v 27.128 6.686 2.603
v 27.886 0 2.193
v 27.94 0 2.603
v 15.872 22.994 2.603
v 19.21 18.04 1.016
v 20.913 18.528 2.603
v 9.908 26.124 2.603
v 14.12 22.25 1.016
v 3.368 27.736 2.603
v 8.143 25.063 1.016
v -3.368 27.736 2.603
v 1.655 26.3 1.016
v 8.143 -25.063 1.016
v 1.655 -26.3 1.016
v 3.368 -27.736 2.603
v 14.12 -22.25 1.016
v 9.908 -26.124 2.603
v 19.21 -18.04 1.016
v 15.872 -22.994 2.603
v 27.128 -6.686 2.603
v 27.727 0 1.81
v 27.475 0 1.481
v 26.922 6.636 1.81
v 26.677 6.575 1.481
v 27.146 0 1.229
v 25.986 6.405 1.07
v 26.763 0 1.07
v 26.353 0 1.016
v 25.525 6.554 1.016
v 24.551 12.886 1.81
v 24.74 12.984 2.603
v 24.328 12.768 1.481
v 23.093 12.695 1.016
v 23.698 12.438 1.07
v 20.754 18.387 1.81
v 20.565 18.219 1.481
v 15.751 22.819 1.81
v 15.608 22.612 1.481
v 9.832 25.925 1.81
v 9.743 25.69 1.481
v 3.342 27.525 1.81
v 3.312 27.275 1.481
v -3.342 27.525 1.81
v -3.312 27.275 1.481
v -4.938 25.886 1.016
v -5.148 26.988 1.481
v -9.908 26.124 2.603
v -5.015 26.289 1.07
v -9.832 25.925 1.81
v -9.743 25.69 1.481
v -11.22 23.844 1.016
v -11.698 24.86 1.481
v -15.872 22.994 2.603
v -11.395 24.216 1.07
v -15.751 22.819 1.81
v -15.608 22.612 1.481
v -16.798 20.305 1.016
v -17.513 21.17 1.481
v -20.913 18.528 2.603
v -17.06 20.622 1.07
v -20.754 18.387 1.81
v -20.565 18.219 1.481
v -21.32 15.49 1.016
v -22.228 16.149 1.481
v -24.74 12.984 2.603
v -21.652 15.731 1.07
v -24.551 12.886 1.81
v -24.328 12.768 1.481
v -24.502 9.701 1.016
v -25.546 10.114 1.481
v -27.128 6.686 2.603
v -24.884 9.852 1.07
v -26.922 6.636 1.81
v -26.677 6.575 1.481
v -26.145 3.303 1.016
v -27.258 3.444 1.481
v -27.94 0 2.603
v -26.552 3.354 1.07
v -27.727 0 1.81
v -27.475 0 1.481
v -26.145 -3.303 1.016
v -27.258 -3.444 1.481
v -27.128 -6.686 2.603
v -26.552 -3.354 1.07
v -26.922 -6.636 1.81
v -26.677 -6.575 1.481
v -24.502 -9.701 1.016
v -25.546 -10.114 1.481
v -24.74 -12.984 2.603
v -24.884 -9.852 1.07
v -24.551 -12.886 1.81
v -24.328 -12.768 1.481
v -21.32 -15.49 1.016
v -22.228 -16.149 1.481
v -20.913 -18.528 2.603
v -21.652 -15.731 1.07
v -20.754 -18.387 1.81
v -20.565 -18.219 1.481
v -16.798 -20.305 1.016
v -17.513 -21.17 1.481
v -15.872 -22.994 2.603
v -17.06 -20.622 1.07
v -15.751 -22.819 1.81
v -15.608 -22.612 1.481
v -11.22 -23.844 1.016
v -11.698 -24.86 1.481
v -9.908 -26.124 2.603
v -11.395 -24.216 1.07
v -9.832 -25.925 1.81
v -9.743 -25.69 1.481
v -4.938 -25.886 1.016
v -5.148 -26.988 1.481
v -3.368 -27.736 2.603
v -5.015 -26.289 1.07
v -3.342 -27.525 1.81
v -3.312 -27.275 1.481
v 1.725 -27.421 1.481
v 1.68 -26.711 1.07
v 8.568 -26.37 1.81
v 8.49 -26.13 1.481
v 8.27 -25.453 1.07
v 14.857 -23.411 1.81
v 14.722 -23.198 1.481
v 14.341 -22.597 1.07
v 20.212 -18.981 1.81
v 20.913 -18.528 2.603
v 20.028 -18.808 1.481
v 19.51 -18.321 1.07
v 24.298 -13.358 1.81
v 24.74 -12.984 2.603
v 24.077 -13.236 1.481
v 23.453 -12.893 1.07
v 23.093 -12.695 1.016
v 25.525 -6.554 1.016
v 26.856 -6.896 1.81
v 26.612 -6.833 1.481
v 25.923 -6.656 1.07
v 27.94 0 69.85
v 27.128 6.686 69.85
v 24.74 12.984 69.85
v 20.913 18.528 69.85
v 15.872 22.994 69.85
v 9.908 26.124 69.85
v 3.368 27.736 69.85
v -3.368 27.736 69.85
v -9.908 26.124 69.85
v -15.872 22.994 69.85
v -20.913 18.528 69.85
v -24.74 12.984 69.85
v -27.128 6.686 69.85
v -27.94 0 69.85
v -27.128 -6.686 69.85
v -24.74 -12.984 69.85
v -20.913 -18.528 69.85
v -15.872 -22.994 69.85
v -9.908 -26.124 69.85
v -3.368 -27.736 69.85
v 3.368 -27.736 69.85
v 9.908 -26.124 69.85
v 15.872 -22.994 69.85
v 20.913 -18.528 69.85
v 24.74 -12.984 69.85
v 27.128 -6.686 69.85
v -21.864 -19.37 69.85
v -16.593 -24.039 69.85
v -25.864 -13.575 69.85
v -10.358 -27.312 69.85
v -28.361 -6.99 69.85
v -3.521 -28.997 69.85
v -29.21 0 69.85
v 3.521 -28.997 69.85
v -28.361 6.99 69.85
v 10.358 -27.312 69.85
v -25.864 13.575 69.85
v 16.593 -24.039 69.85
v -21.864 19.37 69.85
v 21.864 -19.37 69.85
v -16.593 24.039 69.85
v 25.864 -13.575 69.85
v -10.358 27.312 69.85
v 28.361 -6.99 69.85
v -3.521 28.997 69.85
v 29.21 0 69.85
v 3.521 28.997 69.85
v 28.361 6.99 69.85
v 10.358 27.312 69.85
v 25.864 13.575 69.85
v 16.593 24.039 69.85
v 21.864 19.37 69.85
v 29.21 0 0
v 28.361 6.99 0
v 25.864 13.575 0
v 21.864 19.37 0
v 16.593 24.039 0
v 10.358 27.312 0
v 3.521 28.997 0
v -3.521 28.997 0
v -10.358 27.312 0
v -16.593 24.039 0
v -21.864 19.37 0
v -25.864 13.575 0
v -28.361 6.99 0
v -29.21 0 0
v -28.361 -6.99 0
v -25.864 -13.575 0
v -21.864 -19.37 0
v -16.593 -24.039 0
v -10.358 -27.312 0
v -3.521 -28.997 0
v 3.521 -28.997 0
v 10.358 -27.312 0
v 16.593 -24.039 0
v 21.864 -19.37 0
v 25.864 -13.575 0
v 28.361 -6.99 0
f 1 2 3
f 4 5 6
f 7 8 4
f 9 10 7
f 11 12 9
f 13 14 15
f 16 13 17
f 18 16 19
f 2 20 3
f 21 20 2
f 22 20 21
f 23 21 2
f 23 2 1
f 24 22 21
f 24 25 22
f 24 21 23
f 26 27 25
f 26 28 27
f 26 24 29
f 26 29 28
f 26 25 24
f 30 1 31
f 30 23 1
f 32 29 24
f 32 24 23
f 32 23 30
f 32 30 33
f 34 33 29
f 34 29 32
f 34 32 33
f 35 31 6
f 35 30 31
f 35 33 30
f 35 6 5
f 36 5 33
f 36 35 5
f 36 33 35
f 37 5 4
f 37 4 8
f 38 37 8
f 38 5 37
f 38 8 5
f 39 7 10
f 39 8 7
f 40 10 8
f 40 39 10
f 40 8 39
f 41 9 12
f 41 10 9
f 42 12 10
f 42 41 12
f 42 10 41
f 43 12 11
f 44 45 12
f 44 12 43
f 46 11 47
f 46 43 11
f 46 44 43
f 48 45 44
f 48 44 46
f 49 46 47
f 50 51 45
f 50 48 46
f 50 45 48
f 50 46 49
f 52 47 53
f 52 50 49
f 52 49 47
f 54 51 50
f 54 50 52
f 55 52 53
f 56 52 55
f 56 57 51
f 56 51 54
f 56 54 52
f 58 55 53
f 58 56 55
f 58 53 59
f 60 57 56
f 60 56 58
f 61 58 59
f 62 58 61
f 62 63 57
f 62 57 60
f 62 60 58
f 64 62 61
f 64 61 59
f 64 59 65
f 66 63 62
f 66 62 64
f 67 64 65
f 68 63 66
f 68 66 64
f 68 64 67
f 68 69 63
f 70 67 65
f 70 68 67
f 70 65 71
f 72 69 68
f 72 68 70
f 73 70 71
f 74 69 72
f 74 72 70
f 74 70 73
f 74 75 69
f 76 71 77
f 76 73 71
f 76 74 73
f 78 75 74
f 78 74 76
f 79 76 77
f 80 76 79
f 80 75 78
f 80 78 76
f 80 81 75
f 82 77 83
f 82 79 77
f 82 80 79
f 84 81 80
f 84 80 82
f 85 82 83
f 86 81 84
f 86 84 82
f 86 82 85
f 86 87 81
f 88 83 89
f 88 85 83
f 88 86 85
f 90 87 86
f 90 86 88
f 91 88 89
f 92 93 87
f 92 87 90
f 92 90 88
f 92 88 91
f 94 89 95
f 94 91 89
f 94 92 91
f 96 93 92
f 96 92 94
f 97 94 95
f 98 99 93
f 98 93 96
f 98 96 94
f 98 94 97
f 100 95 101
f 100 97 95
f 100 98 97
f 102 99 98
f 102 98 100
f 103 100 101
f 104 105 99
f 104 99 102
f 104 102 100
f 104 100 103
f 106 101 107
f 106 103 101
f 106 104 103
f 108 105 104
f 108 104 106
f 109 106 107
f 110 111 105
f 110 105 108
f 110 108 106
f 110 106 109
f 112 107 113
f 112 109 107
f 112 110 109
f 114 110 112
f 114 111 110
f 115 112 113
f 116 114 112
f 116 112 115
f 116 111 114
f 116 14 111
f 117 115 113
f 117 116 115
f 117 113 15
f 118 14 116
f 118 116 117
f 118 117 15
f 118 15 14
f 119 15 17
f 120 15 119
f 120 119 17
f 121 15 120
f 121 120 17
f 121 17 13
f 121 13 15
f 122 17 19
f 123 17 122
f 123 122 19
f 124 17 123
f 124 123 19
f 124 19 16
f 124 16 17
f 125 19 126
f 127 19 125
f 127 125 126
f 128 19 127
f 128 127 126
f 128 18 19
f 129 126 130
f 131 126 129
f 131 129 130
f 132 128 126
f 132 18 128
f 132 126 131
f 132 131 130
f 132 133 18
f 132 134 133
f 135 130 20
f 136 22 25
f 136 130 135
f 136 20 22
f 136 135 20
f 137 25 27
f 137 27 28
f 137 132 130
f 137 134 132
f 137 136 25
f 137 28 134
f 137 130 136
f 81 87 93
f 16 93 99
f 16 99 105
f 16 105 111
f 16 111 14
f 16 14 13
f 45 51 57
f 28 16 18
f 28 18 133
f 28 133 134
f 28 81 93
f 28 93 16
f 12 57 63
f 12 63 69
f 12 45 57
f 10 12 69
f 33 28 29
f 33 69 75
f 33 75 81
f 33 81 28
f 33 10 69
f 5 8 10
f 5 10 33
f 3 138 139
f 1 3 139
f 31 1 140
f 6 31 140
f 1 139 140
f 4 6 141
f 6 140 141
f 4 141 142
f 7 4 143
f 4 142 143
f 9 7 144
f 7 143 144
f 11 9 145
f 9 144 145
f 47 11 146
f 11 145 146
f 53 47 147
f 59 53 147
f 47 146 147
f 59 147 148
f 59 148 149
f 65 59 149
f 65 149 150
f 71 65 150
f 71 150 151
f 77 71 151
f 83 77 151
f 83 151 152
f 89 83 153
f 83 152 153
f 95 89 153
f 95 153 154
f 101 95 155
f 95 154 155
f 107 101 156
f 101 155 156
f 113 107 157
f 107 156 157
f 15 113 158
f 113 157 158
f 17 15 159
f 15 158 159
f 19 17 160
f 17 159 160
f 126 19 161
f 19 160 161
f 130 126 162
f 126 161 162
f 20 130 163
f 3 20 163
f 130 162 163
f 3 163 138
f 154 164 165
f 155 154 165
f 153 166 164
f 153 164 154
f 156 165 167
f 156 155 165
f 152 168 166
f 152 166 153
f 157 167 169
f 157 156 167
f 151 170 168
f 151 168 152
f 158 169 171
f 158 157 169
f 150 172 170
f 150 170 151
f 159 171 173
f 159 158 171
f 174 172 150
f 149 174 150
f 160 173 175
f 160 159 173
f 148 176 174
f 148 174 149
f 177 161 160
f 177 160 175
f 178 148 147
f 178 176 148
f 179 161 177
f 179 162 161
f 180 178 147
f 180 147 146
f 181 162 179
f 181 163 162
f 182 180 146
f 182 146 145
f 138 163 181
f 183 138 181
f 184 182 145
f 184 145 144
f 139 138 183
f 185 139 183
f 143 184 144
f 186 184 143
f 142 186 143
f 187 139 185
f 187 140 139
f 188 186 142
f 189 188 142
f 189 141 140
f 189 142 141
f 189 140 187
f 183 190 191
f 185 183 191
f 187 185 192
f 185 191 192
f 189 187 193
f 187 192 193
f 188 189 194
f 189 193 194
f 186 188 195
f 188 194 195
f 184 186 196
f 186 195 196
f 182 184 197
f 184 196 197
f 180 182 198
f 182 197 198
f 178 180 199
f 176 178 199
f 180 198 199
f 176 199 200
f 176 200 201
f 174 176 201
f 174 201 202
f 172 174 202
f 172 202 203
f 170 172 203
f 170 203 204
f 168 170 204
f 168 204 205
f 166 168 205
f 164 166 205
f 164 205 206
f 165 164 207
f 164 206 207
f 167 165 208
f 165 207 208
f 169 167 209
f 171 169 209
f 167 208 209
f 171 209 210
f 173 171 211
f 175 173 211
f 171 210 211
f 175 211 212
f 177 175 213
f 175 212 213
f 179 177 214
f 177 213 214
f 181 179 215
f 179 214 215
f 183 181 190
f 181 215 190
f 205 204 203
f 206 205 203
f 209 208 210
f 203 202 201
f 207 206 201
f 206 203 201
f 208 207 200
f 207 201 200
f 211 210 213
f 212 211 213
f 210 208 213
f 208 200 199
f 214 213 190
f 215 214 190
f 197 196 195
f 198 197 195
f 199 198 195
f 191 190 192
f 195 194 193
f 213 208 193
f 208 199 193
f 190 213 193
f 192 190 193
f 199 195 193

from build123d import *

# Parameters (mm, degrees)
F0_R     = 29.21
F1_DEPTH = 69.85
F2_R     = 27.94
F3_DEPTH = 68.834
F4_R     = 1.5875


with BuildPart() as f1:
    # F0 (on Top) → F1 (new body)
    with BuildSketch(Plane.XY):
        Circle(F0_R)
    extrude(amount=F1_DEPTH)

    # F2 (on face) → F3 (cut)
    with BuildSketch(Plane.XY.offset(69.85)):
        Circle(F2_R)
    extrude(amount=-F3_DEPTH, mode=Mode.SUBTRACT)

    # F4
    f4_edges = [f1.edges().sort_by_distance(p)[0] for p in [
        (-27.94, 0, 1.016),
    ]]
    fillet(f4_edges, radius=F4_R)


solid = f1.part
